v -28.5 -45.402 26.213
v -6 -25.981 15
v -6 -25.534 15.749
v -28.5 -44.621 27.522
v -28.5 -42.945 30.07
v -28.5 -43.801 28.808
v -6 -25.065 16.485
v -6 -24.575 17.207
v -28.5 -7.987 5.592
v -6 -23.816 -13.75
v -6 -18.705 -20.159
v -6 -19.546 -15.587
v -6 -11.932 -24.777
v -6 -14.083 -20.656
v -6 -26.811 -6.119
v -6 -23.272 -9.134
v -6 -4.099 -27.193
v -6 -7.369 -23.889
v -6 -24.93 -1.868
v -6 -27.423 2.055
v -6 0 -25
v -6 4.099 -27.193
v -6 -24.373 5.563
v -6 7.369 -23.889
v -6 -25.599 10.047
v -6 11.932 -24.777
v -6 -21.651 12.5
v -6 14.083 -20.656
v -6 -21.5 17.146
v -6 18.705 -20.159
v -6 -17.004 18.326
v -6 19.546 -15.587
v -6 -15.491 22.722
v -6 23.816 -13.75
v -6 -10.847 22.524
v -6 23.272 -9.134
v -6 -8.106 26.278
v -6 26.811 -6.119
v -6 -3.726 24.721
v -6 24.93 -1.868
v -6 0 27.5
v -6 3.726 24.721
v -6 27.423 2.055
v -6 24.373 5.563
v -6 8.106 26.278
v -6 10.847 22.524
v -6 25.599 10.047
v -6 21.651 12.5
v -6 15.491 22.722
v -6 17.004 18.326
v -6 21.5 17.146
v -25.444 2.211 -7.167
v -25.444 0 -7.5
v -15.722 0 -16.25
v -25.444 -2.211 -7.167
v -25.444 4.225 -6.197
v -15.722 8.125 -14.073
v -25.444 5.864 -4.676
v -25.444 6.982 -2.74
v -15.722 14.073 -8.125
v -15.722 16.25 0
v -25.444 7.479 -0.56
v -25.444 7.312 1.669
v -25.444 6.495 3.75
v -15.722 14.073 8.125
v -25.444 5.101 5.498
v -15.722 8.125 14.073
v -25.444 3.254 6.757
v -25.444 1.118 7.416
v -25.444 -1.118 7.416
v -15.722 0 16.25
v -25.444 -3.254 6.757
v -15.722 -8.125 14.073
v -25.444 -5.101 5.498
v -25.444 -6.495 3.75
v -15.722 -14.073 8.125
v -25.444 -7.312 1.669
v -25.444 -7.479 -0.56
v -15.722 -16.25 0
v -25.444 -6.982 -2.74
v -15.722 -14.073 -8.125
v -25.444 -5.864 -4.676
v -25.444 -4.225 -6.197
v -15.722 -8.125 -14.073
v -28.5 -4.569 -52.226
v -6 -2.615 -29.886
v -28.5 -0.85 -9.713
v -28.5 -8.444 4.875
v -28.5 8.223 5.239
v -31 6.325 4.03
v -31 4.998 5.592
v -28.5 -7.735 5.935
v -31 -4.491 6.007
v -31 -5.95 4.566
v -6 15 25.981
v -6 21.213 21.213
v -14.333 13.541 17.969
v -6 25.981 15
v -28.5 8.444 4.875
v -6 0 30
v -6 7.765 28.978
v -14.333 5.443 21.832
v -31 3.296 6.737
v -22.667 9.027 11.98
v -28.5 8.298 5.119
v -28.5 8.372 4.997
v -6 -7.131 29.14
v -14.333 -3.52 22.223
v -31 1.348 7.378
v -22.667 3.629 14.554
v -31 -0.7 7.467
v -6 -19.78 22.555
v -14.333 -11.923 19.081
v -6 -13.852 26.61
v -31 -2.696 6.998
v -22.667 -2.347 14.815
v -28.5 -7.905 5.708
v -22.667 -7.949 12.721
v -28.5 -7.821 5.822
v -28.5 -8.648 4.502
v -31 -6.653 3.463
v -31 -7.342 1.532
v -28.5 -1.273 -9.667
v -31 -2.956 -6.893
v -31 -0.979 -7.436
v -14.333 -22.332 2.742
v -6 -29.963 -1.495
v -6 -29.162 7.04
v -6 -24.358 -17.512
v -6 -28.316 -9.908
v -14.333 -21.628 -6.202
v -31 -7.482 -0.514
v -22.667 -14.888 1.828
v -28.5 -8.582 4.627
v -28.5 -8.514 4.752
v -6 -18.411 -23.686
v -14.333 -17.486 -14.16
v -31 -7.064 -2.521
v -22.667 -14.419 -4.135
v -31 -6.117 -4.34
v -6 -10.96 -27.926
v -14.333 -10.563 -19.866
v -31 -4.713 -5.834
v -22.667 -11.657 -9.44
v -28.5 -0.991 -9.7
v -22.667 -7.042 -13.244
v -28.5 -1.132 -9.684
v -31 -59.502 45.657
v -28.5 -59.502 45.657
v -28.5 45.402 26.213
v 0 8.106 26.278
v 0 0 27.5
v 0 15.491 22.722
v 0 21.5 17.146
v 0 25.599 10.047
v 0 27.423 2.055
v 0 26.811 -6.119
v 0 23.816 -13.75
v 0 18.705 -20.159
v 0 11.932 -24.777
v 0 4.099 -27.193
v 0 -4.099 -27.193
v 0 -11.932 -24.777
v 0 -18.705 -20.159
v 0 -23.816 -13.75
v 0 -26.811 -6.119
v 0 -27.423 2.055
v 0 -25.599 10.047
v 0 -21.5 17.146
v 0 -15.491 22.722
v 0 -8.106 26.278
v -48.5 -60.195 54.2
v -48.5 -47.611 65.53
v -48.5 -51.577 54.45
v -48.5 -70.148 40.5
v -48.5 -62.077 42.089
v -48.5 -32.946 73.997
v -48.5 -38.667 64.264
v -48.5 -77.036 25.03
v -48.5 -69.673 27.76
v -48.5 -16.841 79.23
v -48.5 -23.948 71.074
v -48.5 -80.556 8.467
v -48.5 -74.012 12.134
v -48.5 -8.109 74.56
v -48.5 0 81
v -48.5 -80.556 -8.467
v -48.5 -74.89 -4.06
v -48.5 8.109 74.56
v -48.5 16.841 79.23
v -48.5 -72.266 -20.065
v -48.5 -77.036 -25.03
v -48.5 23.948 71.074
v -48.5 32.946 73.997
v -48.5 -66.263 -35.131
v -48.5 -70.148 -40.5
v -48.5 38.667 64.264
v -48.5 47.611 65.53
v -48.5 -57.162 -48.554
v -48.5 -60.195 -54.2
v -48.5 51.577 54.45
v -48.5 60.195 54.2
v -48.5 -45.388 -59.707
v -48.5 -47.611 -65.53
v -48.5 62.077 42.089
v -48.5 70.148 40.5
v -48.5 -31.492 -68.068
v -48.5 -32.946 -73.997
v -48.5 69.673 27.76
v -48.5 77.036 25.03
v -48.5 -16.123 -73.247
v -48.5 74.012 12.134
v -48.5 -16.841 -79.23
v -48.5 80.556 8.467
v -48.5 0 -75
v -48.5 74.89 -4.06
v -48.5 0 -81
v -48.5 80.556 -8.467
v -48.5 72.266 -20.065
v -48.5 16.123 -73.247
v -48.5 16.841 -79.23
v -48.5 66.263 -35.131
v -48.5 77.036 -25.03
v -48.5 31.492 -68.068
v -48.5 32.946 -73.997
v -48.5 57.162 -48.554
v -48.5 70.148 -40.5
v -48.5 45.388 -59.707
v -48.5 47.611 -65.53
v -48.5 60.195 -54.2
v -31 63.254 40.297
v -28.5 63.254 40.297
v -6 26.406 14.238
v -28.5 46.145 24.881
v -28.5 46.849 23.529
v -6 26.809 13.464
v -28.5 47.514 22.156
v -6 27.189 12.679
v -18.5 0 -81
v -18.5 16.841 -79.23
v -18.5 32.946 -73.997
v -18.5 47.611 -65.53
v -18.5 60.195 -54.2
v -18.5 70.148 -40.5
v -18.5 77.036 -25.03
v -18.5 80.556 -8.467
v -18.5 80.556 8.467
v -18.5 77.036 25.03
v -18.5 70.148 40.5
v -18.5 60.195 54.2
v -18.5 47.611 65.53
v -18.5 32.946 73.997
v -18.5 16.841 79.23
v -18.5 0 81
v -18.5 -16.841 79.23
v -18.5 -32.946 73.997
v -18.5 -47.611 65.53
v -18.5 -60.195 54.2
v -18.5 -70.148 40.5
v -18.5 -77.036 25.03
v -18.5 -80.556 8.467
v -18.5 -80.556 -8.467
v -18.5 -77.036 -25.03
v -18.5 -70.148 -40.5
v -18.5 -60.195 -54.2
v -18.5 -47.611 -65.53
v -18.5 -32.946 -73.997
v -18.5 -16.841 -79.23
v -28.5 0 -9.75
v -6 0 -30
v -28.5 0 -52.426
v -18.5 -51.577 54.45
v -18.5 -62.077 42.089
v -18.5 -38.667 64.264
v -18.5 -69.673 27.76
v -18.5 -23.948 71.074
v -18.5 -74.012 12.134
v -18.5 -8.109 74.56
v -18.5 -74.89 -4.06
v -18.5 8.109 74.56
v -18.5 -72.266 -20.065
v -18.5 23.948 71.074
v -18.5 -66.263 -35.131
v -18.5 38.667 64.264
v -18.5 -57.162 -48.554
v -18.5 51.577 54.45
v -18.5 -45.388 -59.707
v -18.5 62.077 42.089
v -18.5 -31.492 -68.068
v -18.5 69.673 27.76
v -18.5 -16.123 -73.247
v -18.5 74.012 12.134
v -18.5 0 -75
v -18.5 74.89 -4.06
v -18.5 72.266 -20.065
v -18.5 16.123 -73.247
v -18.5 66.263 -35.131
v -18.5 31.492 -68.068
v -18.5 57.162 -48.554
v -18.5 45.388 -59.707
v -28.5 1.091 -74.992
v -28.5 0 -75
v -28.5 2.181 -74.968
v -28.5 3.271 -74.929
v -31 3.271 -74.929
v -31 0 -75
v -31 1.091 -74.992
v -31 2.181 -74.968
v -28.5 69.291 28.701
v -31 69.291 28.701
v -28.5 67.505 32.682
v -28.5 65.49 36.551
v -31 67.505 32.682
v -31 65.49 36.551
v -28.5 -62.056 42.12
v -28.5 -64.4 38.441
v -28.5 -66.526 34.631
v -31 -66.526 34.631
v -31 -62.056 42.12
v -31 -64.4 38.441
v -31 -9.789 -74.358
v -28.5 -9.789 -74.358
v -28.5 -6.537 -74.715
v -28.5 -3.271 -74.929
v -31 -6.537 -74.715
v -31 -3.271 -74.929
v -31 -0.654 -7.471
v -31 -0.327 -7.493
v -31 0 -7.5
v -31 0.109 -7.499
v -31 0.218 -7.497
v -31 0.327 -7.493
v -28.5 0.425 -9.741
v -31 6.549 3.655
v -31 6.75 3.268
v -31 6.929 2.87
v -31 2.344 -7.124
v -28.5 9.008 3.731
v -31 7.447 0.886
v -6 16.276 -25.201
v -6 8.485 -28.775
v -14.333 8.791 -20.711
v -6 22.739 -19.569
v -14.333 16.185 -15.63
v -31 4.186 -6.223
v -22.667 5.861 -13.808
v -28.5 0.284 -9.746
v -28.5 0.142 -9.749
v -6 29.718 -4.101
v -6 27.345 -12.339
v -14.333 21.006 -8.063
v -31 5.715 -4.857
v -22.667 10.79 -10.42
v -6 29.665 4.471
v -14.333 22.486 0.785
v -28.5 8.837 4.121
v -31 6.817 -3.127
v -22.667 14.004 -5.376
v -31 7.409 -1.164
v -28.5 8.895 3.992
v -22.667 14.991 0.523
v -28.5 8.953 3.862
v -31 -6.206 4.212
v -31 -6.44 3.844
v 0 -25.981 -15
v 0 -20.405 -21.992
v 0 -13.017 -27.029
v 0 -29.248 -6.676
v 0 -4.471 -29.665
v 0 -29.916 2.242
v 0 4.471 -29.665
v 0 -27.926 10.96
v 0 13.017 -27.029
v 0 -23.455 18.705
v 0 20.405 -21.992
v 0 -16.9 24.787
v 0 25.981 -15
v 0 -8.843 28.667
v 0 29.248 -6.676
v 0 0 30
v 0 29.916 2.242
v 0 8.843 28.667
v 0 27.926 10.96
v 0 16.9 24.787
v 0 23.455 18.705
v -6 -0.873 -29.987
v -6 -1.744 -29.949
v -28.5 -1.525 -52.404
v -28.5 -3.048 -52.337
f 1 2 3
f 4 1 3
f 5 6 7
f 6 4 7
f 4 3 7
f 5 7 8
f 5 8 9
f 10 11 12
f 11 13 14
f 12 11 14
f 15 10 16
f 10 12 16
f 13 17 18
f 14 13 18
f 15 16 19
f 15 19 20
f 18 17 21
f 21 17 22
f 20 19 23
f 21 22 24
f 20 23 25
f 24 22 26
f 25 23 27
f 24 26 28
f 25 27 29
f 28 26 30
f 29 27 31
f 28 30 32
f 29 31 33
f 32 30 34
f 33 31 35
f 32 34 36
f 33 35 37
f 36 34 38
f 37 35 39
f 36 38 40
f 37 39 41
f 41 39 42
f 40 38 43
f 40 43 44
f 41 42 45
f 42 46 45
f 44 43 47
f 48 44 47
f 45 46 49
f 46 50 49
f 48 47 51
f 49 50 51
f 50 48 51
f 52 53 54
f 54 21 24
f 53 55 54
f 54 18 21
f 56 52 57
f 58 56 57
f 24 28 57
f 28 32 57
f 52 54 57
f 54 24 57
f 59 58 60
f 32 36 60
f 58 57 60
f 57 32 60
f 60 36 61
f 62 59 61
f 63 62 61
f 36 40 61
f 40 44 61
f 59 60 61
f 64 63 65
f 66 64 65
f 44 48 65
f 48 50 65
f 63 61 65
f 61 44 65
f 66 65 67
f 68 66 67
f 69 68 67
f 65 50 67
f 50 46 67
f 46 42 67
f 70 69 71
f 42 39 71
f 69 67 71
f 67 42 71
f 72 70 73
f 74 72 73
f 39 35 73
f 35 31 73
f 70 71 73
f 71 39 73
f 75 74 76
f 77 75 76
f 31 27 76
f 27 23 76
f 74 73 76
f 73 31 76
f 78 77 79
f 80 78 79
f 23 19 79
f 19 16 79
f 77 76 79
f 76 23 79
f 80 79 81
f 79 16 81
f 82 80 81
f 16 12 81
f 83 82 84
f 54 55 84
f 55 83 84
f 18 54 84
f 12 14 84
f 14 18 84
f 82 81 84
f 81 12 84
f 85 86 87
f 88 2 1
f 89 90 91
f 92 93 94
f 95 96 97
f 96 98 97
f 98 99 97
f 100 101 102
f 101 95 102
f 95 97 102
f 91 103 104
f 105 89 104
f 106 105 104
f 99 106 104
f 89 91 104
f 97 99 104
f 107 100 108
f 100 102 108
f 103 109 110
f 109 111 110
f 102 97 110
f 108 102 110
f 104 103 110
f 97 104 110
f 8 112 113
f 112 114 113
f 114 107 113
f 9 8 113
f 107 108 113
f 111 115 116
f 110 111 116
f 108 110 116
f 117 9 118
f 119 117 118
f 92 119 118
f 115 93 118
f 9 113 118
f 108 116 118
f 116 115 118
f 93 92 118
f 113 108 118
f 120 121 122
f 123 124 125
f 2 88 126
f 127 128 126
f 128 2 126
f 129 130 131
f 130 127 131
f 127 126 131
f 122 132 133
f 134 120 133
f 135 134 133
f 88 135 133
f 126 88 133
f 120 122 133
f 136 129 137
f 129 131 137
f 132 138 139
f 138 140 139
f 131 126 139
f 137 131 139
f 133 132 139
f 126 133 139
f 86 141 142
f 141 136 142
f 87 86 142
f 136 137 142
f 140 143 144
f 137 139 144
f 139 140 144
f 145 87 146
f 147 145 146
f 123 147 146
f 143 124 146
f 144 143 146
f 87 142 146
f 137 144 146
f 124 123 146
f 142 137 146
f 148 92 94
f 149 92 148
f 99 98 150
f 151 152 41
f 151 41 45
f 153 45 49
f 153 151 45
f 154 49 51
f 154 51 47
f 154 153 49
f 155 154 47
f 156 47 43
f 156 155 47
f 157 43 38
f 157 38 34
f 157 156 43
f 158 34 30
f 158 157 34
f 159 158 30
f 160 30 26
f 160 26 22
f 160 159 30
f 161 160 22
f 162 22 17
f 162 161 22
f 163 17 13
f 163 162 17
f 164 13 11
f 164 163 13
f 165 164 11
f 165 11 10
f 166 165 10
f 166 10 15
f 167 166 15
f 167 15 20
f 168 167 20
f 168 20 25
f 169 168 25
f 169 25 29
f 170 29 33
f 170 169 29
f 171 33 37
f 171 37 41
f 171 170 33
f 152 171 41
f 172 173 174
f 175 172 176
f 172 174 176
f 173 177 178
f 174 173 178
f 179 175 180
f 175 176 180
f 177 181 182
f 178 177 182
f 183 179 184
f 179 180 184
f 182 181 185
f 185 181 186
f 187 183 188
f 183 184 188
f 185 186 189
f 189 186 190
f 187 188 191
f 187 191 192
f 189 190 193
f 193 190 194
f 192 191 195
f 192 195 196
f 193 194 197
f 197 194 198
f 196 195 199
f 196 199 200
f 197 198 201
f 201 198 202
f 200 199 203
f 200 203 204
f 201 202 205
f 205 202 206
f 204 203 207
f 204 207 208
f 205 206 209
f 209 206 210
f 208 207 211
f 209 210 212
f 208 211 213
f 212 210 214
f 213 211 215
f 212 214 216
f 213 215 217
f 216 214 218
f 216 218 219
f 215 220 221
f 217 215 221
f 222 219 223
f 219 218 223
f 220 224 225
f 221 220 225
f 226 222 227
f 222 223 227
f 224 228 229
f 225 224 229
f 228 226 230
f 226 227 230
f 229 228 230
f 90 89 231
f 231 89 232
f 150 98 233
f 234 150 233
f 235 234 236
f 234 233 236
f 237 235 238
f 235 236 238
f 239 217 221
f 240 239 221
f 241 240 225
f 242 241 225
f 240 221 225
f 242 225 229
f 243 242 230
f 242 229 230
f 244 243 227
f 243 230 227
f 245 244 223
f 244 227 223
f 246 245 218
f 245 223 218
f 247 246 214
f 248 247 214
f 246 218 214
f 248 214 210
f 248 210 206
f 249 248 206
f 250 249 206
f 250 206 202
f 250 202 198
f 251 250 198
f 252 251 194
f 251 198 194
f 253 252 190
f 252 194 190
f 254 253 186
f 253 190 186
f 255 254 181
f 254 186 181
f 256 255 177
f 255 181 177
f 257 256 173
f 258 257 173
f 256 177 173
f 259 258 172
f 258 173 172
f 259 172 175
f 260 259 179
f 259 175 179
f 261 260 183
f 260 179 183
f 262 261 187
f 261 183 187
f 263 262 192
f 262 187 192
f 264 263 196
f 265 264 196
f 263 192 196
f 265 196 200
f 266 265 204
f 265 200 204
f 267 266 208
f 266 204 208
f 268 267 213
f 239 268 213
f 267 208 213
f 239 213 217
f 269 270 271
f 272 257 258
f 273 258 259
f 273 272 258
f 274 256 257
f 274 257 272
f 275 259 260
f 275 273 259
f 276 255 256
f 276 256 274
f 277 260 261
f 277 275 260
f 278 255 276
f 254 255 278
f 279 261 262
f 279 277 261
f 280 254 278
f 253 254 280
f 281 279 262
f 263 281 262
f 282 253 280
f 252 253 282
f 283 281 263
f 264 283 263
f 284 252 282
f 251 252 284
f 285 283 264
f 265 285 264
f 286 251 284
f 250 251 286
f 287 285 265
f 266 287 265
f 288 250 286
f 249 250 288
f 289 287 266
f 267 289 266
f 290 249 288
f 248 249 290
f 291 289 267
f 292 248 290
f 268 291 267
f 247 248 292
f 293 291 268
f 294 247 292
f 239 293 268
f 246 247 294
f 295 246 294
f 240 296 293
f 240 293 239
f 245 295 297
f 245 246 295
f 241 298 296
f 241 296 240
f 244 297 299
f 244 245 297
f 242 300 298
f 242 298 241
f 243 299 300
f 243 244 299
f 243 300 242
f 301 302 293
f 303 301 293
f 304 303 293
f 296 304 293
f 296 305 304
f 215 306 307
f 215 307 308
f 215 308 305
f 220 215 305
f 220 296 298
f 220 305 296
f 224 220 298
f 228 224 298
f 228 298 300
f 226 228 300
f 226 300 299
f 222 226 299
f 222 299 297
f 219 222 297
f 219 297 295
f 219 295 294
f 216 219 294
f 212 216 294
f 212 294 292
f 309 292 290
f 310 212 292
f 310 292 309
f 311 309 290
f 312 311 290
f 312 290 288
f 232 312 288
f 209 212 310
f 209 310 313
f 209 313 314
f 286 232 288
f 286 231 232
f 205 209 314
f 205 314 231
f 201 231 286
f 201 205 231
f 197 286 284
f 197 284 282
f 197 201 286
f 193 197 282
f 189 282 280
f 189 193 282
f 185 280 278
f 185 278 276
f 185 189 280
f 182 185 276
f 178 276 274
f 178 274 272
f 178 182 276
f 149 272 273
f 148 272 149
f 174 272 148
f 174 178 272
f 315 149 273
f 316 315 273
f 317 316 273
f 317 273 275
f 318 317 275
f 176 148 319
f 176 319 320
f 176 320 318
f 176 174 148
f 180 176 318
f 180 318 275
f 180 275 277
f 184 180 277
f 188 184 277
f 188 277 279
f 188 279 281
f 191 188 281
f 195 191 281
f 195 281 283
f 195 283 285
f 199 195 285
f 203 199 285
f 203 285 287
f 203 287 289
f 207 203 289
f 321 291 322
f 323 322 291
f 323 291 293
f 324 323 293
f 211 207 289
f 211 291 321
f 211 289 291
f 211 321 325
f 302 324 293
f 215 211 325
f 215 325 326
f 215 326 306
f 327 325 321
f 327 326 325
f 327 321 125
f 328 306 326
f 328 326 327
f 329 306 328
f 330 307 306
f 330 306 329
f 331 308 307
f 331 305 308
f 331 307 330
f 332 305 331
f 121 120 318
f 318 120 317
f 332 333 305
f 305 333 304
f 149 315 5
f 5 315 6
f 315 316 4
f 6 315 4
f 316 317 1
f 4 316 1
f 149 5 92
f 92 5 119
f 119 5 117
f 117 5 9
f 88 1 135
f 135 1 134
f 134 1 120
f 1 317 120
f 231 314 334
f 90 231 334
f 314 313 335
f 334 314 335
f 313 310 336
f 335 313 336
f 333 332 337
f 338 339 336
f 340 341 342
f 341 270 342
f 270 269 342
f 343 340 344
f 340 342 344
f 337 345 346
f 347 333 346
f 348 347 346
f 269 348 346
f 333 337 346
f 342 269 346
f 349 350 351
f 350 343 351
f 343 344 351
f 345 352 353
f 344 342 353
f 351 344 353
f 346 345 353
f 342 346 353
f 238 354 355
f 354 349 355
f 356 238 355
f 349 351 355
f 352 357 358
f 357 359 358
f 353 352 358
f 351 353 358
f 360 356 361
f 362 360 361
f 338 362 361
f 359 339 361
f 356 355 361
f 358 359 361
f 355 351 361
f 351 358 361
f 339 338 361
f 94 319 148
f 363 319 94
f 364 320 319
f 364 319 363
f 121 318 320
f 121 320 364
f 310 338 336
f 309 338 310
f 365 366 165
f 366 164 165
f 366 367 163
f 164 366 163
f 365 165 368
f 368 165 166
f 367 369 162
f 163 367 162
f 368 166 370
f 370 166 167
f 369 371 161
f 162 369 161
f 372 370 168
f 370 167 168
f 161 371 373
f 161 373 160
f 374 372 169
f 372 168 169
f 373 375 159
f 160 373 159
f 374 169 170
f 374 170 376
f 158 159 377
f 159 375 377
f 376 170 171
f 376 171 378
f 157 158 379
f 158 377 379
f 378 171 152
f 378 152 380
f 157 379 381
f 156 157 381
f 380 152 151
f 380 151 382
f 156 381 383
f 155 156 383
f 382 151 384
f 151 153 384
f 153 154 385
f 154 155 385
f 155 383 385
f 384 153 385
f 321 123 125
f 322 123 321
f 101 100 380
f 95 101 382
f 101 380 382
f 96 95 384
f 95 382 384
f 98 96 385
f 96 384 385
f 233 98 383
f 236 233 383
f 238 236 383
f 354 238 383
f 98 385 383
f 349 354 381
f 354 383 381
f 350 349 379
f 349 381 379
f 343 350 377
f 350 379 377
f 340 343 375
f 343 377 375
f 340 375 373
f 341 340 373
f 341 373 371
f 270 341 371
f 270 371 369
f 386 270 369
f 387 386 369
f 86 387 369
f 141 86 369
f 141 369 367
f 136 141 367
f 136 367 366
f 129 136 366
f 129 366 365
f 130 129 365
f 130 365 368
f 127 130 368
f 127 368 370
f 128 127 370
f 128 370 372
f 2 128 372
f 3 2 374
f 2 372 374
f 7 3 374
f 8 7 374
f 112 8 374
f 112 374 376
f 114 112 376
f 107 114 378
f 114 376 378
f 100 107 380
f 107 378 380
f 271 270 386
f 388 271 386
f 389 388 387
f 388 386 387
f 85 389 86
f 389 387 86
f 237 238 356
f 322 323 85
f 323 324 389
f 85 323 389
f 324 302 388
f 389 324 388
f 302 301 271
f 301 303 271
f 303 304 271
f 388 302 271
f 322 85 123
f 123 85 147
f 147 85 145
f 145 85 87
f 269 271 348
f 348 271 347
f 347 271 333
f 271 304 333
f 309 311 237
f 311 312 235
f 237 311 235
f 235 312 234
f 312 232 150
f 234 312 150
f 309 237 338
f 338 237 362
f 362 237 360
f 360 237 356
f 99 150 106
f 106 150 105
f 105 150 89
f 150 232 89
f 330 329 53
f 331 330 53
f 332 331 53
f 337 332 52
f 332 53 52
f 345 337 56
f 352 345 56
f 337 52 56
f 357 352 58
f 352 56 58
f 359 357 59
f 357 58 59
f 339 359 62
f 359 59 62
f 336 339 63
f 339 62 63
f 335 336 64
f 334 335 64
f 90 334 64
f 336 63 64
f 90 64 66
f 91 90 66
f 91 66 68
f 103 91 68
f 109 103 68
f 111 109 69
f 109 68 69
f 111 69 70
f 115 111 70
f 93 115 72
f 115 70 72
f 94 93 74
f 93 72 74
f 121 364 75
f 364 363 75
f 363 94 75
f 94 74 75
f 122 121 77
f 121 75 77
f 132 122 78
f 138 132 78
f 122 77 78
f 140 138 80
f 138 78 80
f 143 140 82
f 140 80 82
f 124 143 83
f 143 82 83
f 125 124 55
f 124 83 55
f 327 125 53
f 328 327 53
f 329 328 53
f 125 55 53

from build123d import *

# Parameters (mm, degrees)
SKETCH_5_R               = 30
SKETCH_5_R_2             = 27.5
EXTRUDE_1_DEPTH          = 6
REVOLVE_1_OUTLINE_W      = 67.5
REVOLVE_1_OUTLINE_H      = 2.5
REVOLVE_1_ANGLE          = 10
REVOLVE_2_ANGLE          = 5
PATTERN_CIRCULAR_1_COUNT = 3
EXTRUDE_2_DEPTH          = 10
EXTRUDE_2_DEPTH_BACK     = 20
SKETCH_14_R              = 81
SKETCH_14_R_2            = 75


# Read off the part's stored shape, not the designer's step: 旋轉1
with BuildPart() as part:
    # 草圖5 → 填料-伸長1 (new body)
    with BuildSketch(Plane.ZY):
        Circle(SKETCH_5_R)
        Circle(SKETCH_5_R_2, mode=Mode.SUBTRACT)
    extrude(amount=EXTRUDE_1_DEPTH)

    # 草圖13 → 旋轉3 (revolve)
    with BuildSketch(Plane(origin=(0, 0, 0), x_dir=(1, 0, 0), z_dir=(0, 1, 0))):
        Polygon((-6, 30), (-31, 7.5), (-25.444444444, 7.5), (-6, 25), align=None)
    revolve(axis=Axis((-1000, 0, 0), (1, 0, 0)))

    # 旋轉1 outline → 旋轉1 (revolve)
    with BuildSketch(Plane(origin=(0, 0, 0), x_dir=(0, -0.13052619222005293, -0.9914448613738103), z_dir=(0, -0.9914448613738103, 0.13052619222005293))):
        with Locations((41.25, -29.75)):
            Rectangle(REVOLVE_1_OUTLINE_W, REVOLVE_1_OUTLINE_H)
    revolve_1 = revolve(axis=Axis((0, 0, 0), (1, 0, 0)), revolution_arc=REVOLVE_1_ANGLE)

    # 草圖12 → 旋轉2 (revolve)
    with BuildSketch(Plane(origin=(0, 0, 0), x_dir=(1, 0, 0), z_dir=(0, 1, 0))):
        Polygon((-31, 54.917629386), (-6, 30), (-31, 7.5), align=None)
    revolve_2 = revolve(axis=Axis((0, 0, 0), (-1, 0, 0)), revolution_arc=REVOLVE_2_ANGLE)

    # 環狀複製排列1: 旋轉1, 旋轉2 ×3 about axis
    pattern_circular_1_axis = Axis((0, 0, 0), (1, 0, 0))
    add([revolve_1.rotate(pattern_circular_1_axis, i * 360 / PATTERN_CIRCULAR_1_COUNT) for i in range(1, PATTERN_CIRCULAR_1_COUNT)])
    add([revolve_2.rotate(pattern_circular_1_axis, i * 360 / PATTERN_CIRCULAR_1_COUNT) for i in range(1, PATTERN_CIRCULAR_1_COUNT)])

    # 草圖14 → 填料-伸長2 (add, two sides: drawn at the far end of the back side and taken through both)
    with BuildSketch(Plane(origin=(-28.5, 0, 0), x_dir=(0, 0, -1), z_dir=(1, 0, 0)).offset(-EXTRUDE_2_DEPTH_BACK)):
        Circle(SKETCH_14_R)
        Circle(SKETCH_14_R_2, mode=Mode.SUBTRACT)
    extrude(amount=EXTRUDE_2_DEPTH + EXTRUDE_2_DEPTH_BACK)


solid = part.part
